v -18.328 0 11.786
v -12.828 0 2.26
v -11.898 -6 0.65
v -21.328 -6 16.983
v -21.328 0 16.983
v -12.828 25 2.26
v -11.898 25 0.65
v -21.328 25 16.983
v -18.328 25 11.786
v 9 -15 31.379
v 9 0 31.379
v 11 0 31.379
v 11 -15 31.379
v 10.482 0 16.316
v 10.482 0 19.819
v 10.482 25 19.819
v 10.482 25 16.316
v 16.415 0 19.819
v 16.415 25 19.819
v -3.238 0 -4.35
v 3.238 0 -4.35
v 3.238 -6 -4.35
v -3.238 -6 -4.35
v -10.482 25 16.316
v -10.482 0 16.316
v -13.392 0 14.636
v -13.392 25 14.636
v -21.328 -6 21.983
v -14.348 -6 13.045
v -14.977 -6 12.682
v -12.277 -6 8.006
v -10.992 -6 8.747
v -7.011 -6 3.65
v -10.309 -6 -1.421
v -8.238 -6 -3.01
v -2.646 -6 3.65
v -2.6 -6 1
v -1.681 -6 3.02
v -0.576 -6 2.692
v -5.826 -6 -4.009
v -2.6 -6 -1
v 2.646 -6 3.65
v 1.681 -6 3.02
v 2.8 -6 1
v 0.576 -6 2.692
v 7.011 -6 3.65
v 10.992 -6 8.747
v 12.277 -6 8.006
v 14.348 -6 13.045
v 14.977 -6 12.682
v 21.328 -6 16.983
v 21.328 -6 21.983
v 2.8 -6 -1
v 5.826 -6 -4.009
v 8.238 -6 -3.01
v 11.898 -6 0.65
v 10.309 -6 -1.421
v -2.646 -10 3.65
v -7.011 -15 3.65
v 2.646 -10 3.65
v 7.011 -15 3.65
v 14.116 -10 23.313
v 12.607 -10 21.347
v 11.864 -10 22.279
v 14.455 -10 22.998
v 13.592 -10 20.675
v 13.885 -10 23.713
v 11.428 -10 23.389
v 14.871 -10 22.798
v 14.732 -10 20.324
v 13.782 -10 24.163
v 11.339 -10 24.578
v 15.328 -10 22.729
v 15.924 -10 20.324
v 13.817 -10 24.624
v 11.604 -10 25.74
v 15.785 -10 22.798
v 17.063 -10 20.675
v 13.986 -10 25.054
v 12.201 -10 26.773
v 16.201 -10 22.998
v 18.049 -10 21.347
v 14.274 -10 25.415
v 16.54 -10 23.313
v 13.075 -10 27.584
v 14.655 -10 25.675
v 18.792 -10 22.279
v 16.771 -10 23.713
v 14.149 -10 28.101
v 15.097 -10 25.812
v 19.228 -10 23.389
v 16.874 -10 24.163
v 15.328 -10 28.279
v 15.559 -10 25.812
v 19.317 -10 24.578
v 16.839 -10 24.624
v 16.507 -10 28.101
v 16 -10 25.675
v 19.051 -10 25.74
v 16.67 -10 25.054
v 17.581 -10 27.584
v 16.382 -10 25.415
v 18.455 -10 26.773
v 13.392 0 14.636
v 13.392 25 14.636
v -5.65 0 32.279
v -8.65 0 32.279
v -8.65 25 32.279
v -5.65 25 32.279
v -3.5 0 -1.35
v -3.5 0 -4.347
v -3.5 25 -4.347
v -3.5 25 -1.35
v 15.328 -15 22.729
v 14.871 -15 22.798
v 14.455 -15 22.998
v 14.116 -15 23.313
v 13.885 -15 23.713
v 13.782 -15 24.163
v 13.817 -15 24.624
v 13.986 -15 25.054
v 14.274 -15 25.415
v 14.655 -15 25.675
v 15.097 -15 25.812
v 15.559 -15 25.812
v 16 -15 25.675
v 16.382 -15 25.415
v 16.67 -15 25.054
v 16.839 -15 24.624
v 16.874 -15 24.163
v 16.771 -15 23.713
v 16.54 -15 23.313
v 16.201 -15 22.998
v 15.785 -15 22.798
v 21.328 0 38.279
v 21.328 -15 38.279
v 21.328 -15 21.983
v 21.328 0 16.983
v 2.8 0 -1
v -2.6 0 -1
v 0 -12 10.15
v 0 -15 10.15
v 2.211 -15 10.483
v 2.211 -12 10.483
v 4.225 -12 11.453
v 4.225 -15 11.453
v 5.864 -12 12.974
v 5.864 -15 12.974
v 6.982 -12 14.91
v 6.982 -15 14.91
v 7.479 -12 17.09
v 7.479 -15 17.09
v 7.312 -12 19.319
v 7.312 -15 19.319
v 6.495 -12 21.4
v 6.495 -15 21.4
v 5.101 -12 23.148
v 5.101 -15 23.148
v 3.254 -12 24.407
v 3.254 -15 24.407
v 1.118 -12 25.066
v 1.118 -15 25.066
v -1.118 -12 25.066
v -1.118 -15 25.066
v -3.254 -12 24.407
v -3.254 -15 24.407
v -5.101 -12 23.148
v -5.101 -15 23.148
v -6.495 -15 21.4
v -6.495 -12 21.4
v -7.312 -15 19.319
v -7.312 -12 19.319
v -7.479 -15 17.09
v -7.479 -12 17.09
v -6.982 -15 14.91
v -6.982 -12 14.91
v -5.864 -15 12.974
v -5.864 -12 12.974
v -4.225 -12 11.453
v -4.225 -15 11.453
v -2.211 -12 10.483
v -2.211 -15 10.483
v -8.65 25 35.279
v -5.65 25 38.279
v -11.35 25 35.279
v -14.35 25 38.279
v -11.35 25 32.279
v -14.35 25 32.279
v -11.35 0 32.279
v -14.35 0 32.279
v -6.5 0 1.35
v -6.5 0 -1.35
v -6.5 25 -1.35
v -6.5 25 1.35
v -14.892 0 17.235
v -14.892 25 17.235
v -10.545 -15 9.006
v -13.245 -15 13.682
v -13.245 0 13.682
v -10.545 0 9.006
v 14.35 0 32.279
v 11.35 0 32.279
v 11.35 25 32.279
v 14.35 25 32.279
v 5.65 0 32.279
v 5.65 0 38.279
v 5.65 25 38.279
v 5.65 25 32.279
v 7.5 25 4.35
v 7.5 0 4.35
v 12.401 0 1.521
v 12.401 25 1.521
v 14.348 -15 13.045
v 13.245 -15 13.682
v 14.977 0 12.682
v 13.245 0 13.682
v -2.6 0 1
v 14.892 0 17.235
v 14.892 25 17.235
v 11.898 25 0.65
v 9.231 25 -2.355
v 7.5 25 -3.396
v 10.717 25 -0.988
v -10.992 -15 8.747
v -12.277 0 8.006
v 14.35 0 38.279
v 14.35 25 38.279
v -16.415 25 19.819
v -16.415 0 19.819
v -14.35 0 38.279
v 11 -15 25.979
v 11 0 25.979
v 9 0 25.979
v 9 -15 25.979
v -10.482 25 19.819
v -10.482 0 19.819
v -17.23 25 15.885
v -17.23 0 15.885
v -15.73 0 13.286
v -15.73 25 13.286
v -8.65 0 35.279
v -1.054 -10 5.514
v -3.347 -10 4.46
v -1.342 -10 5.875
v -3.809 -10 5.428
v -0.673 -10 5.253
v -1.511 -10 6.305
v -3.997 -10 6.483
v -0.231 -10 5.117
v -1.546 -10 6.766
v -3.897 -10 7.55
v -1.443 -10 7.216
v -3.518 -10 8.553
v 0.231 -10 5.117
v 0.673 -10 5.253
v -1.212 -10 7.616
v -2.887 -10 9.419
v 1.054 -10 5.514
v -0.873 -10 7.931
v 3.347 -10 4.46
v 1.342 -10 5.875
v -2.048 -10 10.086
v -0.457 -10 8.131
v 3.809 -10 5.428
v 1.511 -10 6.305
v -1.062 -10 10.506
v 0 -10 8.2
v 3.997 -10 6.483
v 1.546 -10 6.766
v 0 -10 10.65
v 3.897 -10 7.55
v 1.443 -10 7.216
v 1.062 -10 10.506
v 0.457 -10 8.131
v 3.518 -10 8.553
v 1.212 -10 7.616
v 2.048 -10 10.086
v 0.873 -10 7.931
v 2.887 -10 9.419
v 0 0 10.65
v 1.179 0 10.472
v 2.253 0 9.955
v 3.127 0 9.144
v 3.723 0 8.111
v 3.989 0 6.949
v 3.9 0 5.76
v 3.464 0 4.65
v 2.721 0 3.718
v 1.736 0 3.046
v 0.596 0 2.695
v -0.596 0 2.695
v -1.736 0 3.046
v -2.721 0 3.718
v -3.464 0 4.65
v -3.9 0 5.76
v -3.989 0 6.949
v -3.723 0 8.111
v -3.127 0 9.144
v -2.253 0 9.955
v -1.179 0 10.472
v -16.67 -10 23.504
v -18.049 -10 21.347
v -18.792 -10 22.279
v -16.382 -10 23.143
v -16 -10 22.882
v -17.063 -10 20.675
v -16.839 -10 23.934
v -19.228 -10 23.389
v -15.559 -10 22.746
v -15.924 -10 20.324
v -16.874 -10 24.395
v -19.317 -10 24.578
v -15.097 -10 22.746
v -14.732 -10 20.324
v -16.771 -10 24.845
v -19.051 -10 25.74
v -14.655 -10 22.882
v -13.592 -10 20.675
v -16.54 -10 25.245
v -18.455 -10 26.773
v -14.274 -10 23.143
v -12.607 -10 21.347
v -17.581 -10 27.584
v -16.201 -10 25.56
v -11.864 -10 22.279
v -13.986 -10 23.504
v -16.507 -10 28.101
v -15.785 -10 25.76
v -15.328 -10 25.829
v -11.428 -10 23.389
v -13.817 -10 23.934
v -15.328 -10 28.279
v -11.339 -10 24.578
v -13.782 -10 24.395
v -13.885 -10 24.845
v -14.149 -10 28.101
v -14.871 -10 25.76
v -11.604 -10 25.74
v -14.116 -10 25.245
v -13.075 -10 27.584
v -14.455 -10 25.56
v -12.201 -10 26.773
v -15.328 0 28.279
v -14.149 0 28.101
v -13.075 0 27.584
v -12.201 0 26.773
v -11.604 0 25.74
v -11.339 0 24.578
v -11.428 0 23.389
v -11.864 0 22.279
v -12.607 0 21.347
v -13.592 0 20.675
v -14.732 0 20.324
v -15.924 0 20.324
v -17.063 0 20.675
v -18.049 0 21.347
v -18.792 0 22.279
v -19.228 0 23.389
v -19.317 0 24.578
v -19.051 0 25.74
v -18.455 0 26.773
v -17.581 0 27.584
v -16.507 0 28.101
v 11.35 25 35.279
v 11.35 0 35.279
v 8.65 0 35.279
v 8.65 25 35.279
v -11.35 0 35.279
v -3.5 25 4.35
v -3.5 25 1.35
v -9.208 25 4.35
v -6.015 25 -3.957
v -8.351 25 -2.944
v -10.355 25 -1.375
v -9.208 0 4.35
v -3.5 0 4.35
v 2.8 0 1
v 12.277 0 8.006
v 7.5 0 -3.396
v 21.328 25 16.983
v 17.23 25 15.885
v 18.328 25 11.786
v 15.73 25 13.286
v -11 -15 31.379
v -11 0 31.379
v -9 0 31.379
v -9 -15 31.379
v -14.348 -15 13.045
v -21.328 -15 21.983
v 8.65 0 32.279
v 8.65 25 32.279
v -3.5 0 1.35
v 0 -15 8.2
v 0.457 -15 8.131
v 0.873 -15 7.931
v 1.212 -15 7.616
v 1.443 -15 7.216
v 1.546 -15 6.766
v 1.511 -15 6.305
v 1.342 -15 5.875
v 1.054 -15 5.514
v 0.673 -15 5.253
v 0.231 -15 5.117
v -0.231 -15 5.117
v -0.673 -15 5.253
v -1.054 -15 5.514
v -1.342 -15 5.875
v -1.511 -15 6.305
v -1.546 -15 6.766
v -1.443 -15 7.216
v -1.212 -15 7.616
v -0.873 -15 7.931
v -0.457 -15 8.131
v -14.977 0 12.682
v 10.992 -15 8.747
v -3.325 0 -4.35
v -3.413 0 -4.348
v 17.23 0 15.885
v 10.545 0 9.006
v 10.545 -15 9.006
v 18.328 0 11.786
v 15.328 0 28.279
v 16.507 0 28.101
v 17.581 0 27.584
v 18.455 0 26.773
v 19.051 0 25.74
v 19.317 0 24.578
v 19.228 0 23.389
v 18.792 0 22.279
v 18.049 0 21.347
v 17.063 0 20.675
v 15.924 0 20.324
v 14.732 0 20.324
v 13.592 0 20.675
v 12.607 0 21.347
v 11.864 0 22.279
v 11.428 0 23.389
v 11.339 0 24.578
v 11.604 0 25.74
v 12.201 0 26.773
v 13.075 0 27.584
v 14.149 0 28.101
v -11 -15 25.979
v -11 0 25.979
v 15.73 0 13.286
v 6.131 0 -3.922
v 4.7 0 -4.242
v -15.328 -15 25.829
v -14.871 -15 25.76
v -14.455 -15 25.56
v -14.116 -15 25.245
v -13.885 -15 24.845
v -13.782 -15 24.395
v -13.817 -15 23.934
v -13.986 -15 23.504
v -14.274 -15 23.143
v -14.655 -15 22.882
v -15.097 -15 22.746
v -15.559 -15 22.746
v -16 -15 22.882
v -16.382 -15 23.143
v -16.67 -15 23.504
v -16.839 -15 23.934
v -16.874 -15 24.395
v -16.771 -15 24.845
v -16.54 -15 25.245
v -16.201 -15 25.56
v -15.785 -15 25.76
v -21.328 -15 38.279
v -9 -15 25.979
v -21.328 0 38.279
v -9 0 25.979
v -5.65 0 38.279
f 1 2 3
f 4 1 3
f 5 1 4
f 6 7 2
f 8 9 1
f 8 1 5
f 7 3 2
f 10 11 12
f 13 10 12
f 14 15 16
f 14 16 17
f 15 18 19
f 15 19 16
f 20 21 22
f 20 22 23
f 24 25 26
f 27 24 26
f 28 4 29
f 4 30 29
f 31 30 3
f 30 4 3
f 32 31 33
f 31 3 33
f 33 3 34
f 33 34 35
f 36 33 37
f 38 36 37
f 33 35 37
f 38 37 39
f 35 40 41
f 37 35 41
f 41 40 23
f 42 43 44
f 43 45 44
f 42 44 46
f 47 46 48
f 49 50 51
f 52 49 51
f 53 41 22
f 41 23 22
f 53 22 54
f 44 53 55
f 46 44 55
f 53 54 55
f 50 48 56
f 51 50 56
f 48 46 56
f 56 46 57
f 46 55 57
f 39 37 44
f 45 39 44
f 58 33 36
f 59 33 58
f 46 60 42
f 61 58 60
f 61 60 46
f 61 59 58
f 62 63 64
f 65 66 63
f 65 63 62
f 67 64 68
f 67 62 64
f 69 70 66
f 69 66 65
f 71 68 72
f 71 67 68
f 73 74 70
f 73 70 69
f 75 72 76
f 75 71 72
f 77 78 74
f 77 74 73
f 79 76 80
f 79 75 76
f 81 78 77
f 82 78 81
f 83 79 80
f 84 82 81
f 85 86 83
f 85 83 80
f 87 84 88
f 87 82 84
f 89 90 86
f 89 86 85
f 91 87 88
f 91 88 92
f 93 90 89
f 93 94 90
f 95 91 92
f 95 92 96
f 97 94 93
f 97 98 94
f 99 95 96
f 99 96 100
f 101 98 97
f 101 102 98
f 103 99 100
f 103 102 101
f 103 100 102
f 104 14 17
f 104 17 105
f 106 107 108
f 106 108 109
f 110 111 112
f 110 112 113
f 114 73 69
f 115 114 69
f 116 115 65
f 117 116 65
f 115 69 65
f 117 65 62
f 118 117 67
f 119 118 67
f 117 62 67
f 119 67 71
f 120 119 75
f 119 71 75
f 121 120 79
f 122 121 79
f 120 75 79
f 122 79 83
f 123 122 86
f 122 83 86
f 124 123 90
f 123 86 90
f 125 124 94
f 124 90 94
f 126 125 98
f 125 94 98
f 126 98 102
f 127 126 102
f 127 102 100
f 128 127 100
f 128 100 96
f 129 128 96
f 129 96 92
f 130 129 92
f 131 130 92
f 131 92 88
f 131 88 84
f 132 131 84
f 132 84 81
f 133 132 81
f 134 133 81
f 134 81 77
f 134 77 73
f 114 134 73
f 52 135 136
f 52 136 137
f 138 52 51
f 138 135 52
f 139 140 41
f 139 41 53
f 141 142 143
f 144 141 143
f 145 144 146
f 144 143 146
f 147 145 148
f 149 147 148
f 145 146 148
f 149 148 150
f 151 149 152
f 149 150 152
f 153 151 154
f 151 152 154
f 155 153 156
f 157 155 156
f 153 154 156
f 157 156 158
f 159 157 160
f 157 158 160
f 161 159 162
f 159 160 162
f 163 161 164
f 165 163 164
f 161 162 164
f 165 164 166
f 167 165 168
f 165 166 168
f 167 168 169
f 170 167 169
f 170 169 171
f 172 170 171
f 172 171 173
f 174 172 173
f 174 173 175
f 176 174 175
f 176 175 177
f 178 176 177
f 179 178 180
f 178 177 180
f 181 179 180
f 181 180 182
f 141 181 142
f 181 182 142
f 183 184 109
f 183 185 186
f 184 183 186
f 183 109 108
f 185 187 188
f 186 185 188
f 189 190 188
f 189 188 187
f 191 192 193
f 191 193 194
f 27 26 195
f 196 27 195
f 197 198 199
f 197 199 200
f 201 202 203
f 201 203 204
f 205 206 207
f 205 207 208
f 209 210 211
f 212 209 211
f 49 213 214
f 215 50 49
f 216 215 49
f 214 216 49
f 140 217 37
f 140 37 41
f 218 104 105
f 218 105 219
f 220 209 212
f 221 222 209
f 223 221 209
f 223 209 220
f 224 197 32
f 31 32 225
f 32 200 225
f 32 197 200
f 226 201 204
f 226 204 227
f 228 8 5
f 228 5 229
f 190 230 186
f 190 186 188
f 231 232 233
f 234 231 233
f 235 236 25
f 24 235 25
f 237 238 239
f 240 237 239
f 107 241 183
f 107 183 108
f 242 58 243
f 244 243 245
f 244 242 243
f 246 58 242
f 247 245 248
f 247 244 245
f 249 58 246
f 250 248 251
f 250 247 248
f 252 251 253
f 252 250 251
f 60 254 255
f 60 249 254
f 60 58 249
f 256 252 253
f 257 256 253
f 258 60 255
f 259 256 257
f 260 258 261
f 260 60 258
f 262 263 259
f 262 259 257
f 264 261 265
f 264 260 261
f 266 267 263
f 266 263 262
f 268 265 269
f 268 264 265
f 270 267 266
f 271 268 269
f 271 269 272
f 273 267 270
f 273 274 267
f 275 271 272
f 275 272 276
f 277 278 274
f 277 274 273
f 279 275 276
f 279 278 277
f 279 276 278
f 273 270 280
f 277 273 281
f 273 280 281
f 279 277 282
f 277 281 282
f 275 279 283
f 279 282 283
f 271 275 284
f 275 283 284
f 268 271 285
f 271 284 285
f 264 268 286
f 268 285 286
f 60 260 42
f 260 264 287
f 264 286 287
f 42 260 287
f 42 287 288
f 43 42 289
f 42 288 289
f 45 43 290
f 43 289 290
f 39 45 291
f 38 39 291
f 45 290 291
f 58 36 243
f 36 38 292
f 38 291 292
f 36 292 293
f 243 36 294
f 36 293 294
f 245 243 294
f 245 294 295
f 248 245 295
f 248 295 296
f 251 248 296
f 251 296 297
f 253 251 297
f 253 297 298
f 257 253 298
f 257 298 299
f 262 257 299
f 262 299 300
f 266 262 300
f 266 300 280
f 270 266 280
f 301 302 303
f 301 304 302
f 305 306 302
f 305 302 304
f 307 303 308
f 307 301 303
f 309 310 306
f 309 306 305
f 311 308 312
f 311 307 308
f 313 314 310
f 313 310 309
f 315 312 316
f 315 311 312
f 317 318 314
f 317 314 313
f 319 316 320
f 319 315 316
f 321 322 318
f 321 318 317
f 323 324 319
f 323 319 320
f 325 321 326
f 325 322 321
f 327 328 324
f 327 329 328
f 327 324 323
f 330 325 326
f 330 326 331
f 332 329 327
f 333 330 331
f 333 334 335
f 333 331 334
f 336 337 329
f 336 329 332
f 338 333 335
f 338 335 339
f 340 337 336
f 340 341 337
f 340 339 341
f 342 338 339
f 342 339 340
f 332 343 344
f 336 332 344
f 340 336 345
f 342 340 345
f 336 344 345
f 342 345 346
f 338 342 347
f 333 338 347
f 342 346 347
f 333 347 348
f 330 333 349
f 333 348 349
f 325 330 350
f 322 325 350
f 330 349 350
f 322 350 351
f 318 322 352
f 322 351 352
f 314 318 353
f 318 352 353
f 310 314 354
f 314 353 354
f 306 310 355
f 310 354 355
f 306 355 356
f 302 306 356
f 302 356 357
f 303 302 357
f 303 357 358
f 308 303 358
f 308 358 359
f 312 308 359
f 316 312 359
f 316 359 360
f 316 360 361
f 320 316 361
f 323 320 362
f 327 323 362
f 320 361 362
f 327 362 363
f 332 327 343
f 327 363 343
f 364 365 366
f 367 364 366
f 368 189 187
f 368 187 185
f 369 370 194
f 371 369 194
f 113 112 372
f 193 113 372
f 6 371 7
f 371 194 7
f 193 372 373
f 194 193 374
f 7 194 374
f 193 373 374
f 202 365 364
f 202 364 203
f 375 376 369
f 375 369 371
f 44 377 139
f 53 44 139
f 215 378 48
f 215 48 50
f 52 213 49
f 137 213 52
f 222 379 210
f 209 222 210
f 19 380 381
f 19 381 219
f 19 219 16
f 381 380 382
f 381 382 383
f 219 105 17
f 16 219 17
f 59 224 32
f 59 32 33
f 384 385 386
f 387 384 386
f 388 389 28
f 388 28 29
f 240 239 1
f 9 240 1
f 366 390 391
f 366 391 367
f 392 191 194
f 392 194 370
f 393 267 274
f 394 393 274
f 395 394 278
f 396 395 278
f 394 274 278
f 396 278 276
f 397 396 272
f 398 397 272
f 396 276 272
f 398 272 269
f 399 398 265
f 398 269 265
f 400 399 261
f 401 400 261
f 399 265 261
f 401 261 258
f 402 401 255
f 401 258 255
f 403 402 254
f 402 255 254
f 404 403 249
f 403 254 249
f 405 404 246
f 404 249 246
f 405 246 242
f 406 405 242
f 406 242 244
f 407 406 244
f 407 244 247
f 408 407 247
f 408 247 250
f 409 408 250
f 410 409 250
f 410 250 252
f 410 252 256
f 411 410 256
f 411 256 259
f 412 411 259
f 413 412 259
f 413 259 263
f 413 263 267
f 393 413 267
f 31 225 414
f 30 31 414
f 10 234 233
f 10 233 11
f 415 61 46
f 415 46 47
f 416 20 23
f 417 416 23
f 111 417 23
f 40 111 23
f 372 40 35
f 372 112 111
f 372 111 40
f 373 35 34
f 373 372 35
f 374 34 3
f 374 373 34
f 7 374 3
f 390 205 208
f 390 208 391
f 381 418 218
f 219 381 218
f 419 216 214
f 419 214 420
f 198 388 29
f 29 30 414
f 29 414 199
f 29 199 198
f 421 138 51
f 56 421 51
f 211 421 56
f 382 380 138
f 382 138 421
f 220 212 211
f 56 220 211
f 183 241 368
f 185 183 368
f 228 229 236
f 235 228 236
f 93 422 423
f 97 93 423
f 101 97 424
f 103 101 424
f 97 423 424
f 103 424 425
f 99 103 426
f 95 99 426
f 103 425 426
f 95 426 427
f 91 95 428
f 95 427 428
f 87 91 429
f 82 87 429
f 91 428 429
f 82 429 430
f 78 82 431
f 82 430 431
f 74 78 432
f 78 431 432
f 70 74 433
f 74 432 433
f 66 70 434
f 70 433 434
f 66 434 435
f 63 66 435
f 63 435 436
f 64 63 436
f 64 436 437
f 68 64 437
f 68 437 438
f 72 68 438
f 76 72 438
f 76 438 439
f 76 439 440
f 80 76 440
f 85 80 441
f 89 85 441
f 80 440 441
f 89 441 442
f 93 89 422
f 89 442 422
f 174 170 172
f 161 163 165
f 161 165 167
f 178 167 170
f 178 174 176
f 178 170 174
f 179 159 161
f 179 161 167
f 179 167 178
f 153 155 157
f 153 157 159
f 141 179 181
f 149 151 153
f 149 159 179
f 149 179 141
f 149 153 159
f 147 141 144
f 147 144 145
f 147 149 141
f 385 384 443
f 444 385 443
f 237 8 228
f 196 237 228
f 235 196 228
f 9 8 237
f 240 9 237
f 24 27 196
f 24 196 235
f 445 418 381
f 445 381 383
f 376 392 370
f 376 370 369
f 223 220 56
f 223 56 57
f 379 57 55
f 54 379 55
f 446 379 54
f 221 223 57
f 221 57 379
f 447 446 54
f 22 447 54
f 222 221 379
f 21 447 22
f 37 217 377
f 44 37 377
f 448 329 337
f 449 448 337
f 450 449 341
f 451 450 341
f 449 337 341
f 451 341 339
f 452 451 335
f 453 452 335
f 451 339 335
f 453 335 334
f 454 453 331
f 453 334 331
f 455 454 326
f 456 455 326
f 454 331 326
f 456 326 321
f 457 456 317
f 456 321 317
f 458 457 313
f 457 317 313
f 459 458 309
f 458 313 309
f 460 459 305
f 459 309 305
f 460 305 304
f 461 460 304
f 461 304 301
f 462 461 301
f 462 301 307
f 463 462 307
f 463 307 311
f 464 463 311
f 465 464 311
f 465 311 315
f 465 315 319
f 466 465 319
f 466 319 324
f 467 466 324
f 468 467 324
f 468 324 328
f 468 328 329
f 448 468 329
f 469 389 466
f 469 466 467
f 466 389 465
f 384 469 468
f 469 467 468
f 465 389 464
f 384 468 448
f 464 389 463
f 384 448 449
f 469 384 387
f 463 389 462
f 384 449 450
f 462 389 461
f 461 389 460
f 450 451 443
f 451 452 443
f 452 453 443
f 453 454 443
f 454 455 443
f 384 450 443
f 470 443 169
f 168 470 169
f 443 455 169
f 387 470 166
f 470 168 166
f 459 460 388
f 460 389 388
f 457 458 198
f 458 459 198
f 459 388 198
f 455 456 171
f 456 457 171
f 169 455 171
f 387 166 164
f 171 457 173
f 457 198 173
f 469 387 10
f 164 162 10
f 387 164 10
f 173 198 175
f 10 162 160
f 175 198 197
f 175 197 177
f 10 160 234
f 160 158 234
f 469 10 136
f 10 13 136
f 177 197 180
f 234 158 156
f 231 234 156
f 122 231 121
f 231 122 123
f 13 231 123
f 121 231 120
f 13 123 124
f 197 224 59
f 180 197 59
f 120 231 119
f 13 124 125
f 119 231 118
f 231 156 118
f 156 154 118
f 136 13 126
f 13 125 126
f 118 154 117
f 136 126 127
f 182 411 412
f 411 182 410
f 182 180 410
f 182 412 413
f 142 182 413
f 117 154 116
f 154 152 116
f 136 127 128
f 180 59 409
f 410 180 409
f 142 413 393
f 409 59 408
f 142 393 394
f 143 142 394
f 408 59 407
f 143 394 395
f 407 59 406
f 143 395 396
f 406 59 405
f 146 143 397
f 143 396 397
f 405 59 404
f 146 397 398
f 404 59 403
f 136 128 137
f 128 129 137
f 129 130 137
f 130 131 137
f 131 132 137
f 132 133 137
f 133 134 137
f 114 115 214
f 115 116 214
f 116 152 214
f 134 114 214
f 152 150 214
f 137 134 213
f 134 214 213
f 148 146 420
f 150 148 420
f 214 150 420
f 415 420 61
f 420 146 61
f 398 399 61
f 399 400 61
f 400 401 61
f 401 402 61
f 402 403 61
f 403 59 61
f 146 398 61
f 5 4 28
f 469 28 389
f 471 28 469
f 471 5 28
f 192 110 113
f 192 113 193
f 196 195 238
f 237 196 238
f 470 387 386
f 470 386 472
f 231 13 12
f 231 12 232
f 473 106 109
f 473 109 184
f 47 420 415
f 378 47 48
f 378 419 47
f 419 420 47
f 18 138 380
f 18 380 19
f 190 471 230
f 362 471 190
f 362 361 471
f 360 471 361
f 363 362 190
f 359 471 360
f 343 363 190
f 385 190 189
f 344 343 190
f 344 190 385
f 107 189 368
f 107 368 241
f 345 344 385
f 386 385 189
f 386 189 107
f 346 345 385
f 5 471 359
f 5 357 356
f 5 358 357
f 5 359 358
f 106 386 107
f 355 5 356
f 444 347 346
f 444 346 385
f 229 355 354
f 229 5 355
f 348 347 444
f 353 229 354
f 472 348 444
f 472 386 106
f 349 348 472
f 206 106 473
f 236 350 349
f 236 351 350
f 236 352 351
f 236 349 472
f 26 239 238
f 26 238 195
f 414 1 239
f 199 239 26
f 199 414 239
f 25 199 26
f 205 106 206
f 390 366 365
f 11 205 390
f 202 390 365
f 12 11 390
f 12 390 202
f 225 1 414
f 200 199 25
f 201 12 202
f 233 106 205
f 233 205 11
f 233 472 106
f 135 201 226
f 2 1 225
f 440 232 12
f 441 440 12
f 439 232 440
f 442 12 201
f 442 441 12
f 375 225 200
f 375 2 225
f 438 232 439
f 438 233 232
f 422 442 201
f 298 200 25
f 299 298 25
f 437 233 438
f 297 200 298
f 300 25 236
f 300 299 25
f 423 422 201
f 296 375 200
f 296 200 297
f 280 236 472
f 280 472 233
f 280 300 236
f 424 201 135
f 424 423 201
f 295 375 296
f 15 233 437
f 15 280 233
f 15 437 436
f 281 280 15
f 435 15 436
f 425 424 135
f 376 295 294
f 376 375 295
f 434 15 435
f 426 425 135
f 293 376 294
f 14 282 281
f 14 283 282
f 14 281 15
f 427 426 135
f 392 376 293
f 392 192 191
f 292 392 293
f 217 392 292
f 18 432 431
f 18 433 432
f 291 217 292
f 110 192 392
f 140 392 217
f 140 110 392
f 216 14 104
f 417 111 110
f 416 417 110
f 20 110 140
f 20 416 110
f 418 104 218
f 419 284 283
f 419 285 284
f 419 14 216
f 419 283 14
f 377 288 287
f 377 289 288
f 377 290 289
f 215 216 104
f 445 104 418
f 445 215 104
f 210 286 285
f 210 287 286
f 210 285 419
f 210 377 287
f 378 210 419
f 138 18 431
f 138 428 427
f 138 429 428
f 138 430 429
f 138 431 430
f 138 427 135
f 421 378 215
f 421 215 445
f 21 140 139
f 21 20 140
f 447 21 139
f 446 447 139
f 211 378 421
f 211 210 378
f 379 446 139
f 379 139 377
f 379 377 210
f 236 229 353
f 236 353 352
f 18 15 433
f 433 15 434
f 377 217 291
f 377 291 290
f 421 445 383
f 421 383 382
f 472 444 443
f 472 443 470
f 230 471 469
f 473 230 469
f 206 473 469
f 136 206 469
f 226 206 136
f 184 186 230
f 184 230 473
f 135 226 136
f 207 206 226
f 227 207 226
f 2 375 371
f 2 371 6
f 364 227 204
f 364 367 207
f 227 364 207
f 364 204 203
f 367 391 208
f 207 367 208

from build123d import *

# Parameters (mm, degrees)
BOSS_EXTRUDE1_DEPTH   = 25
BOSS_EXTRUDE1_2_DEPTH = 25
BOSS_EXTRUDE1_3_DEPTH = 25
BOSS_EXTRUDE1_4_DEPTH = 25
BOSS_EXTRUDE1_5_DEPTH = 25
BOSS_EXTRUDE1_6_DEPTH = 25
BOSS_EXTRUDE2_DEPTH   = 15
SKETCH3_R             = 1.5499999999999976
SKETCH3_R_2           = 1.5499999999999996
SKETCH3_R_3           = 1.5499999999999958
SKETCH3_W             = 5.4
SKETCH3_H             = 2
SKETCH3_W_2           = 2
SKETCH3_H_2           = 5.400000000000006
CUT_EXTRUDE1_DEPTH    = 51.449536703397406
SKETCH4_R             = 4.000000000000001
SKETCH4_R_2           = 4
SKETCH4_R_3           = 3.9999999999999973
CUT_EXTRUDE2_DEPTH    = 10
CUT_EXTRUDE12_DEPTH   = 9
SKETCH18_R            = 7.5
CUT_EXTRUDE13_DEPTH   = 3
FILLET1_R             = 10


with BuildPart() as part:
    # Sketch1 → Boss-Extrude1 (new body)
    with BuildSketch(Plane(origin=(0, 0, 0), x_dir=(1, 0, 0), z_dir=(0, 1, 0))):
        Polygon((-3.4999999999999987, -4.3500000000000005), (-9.208219674195641, -4.350000000000002), (-12.827870678242386, -2.260193518441092), (-9.011473670974864, 4.35), (-3.499999999999964, 4.35), (-3.4999999999999636, 1.35), (-6.499999999999999, 1.3499999999999996), (-6.499999999999999, -1.3500000000000005), (-3.4999999999999987, -1.3500000000000008), align=None)
    extrude(amount=BOSS_EXTRUDE1_DEPTH)



with BuildPart() as body_2:
    # Sketch1 → Boss-Extrude1 2 (new body)
    with BuildSketch(Plane(origin=(0, 0, 0), x_dir=(1, 0, 0), z_dir=(0, 1, 0))):
        Polygon((-21.327870678242448, -16.982625382776504), (-16.414613987909505, -19.81929545553799), (-10.481908744213749, -19.819295455538416), (-10.48190874421371, -16.31634119473297), (-13.391525876671139, -14.636472960069911), (-14.891525876671151, -17.23454917142322), (-16.06066017178014, -16.559549171423214), (-17.22979446688913, -15.884549171423206), (-15.729794466888796, -13.286472960069348), (-18.327870678242103, -11.786472960069336), align=None)
    extrude(amount=BOSS_EXTRUDE1_2_DEPTH)


with BuildPart() as body_3:
    # Sketch1 → Boss-Extrude1 3 (new body)
    with BuildSketch(Plane(origin=(0, 0, 0), x_dir=(1, 0, 0), z_dir=(0, 1, 0))):
        Polygon((9.011473670974846, 4.350000000000008), (7.500000000000001, 4.35), (7.500000000000003, -4.35), (12.400815759693463, -1.5205127018921853), align=None)
    extrude(amount=BOSS_EXTRUDE1_3_DEPTH)


with BuildPart() as body_4:
    # Sketch1 → Boss-Extrude1 4 (new body)
    with BuildSketch(Plane(origin=(0, 0, 0), x_dir=(1, 0, 0), z_dir=(0, 1, 0))):
        Polygon((21.3278706782425, -16.982625382776575), (16.4146139879095, -19.819295455537993), (10.481908744213753, -19.819295455538413), (10.481908744213746, -16.316341194733052), (13.391525876671182, -14.636472960069986), (14.891525876671192, -17.234549171423296), (16.060660171780043, -16.559549171423036), (17.22979446688917, -15.884549171423286), (15.729794466888857, -13.286472960069448), (18.32787067824215, -11.78647296006941), align=None)
    extrude(amount=BOSS_EXTRUDE1_4_DEPTH)


with BuildPart() as body_5:
    # Sketch1 → Boss-Extrude1 5 (new body)
    with BuildSketch(Plane(origin=(0, 0, 0), x_dir=(1, 0, 0), z_dir=(0, 1, 0))):
        Polygon((9.999999999999996, -35.27894572633552), (11.349999999999998, -35.27894572633552), (11.349999999999998, -32.27894572633372), (14.349999999999998, -32.27894572633372), (14.349999999999998, -38.27894572633372), (5.649999999999999, -38.27894572633372), (5.649999999999998, -32.27894572633428), (8.649999999999999, -32.27894572633428), (8.649999999999999, -35.27894572633552), align=None)
    extrude(amount=BOSS_EXTRUDE1_5_DEPTH)


with BuildPart() as body_6:
    # Sketch1 → Boss-Extrude1 6 (new body)
    with BuildSketch(Plane(origin=(0, 0, 0), x_dir=(1, 0, 0), z_dir=(0, 1, 0))):
        Polygon((-5.649999999999998, -32.27894572633428), (-5.649999999999999, -38.27894572633372), (-14.349999999999998, -38.27894572633372), (-14.349999999999998, -32.27894572633372), (-11.349999999999998, -32.27894572633372), (-11.349999999999998, -35.27894572633552), (-9.999999999999996, -35.27894572633552), (-8.649999999999999, -35.27894572633552), (-8.649999999999999, -32.27894572633428), align=None)
    extrude(amount=BOSS_EXTRUDE1_6_DEPTH)


with BuildPart() as part_1:
    add(part.part)

    add(body_2.part)  # Boss-Extrude2 merges body 2

    add(body_3.part)  # Boss-Extrude2 merges body 3

    add(body_4.part)  # Boss-Extrude2 merges body 4

    add(body_5.part)  # Boss-Extrude2 merges body 5

    add(body_6.part)  # Boss-Extrude2 merges body 6
    # Sketch2 → Boss-Extrude2 (add)
    with BuildSketch(Plane(origin=(0, 0, 0), x_dir=(-1, 0, 0), z_dir=(0, -1, 0))):
        Polygon((-21.3278706782425, -16.982625382776575), (-9.011473670974844, 4.350000000000008), (9.011473670974864, 4.35), (21.327870678242448, -16.982625382776515), (21.327870678242448, -38.27894572633375), (-21.3278706782425, -38.27894572633371), align=None)
    extrude(amount=BOSS_EXTRUDE2_DEPTH)

    # Sketch3 → Cut-Extrude1 (cut, through all)
    with BuildSketch(Plane(origin=(0, 0, 0), x_dir=(1, 0, 0), z_dir=(0, 1, 0))):
        with Locations(Location((-15.327870678242446, -24.278945726333717, 0), (0, 0, 270))):
            Circle(SKETCH3_R)
        with Locations(Location((1.55e-15, -6.649999999999997, 0), (0, 0, 270))):
            Circle(SKETCH3_R_2)
        with Locations(Location((15.327870678242453, -24.278945726333713, 0), (0, 0, 90))):
            Circle(SKETCH3_R_3)
        with Locations((0.10000000000000098, 0)):
            Rectangle(SKETCH3_W, SKETCH3_H)
        Polygon((-14.976685575564561, -12.682050096663907), (-13.244634767995688, -13.682050096663914), (-10.54463476799567, -9.005512916227953), (-12.276685575564542, -8.005512916227948), align=None)
        Polygon((11.000000000000004, -25.978945726335514), (9.000000000000004, -25.978945726335514), (9.000000000000007, -31.37894572633552), (11.000000000000007, -31.37894572633552), align=None)
        with Locations((-9.999999999999996, -28.678945726335517)):
            Rectangle(SKETCH3_W_2, SKETCH3_H_2)
        Polygon((10.544634767995705, -9.005512916227941), (12.27668557556458, -8.005512916227937), (14.976685575564584, -12.682050096663904), (13.244634767995707, -13.682050096663906), align=None)
    extrude(amount=-CUT_EXTRUDE1_DEPTH, mode=Mode.SUBTRACT)

    # Sketch4 → Cut-Extrude2 (cut)
    with BuildSketch(Plane(origin=(0, 0, 0), x_dir=(1, 0, 0), z_dir=(0, 1, 0))):
        with Locations(Location((-15.327870678242446, -24.278945726333717, 0), (0, 0, 270))):
            Circle(SKETCH4_R)
        with Locations(Location((1.55e-15, -6.649999999999996, 0), (0, 0, 270))):
            Circle(SKETCH4_R_2)
        with Locations(Location((15.327870678242453, -24.278945726333713, 0), (0, 0, 270))):
            Circle(SKETCH4_R_3)
    extrude(amount=-CUT_EXTRUDE2_DEPTH, mode=Mode.SUBTRACT)

    # Sketch17 → Cut-Extrude12 (cut)
    with BuildSketch(Plane(origin=(0, -15, 0), x_dir=(-1, 0, 0), z_dir=(0, -1, 0))):
        Polygon((7.011473670974844, -3.6499999999999915), (-7.011473670974842, -3.6499999999999932), (-21.32787067824244, -21.982625382776526), (-21.32787067824244, -16.982625382776508), (-9.011473670974846, 4.350000000000003), (9.011473670974864, 4.35), (21.327870678242448, -16.982625382776515), (21.327870678242448, -21.98262538277652), align=None)
    extrude(amount=-CUT_EXTRUDE12_DEPTH, mode=Mode.SUBTRACT)

    # Sketch18 → Cut-Extrude13 (cut)
    with BuildSketch(Plane(origin=(0, -15, 0), x_dir=(-1, 0, 0), z_dir=(0, -1, 0))):
        with Locations(Location((0, -17.650000000000002, 0), (0, 0, 90))):
            Circle(SKETCH18_R)
    extrude(amount=-CUT_EXTRUDE13_DEPTH, mode=Mode.SUBTRACT)

    # Fillet1
    fillet1_edges = [part_1.edges().sort_by_distance(p)[0] for p in [
        (-9.011473670974864, 9.5, -4.35),
        (9.011473670974846, 9.5, -4.350000000000008),
    ]]
    fillet(fillet1_edges, radius=FILLET1_R)


solid = part_1.part
